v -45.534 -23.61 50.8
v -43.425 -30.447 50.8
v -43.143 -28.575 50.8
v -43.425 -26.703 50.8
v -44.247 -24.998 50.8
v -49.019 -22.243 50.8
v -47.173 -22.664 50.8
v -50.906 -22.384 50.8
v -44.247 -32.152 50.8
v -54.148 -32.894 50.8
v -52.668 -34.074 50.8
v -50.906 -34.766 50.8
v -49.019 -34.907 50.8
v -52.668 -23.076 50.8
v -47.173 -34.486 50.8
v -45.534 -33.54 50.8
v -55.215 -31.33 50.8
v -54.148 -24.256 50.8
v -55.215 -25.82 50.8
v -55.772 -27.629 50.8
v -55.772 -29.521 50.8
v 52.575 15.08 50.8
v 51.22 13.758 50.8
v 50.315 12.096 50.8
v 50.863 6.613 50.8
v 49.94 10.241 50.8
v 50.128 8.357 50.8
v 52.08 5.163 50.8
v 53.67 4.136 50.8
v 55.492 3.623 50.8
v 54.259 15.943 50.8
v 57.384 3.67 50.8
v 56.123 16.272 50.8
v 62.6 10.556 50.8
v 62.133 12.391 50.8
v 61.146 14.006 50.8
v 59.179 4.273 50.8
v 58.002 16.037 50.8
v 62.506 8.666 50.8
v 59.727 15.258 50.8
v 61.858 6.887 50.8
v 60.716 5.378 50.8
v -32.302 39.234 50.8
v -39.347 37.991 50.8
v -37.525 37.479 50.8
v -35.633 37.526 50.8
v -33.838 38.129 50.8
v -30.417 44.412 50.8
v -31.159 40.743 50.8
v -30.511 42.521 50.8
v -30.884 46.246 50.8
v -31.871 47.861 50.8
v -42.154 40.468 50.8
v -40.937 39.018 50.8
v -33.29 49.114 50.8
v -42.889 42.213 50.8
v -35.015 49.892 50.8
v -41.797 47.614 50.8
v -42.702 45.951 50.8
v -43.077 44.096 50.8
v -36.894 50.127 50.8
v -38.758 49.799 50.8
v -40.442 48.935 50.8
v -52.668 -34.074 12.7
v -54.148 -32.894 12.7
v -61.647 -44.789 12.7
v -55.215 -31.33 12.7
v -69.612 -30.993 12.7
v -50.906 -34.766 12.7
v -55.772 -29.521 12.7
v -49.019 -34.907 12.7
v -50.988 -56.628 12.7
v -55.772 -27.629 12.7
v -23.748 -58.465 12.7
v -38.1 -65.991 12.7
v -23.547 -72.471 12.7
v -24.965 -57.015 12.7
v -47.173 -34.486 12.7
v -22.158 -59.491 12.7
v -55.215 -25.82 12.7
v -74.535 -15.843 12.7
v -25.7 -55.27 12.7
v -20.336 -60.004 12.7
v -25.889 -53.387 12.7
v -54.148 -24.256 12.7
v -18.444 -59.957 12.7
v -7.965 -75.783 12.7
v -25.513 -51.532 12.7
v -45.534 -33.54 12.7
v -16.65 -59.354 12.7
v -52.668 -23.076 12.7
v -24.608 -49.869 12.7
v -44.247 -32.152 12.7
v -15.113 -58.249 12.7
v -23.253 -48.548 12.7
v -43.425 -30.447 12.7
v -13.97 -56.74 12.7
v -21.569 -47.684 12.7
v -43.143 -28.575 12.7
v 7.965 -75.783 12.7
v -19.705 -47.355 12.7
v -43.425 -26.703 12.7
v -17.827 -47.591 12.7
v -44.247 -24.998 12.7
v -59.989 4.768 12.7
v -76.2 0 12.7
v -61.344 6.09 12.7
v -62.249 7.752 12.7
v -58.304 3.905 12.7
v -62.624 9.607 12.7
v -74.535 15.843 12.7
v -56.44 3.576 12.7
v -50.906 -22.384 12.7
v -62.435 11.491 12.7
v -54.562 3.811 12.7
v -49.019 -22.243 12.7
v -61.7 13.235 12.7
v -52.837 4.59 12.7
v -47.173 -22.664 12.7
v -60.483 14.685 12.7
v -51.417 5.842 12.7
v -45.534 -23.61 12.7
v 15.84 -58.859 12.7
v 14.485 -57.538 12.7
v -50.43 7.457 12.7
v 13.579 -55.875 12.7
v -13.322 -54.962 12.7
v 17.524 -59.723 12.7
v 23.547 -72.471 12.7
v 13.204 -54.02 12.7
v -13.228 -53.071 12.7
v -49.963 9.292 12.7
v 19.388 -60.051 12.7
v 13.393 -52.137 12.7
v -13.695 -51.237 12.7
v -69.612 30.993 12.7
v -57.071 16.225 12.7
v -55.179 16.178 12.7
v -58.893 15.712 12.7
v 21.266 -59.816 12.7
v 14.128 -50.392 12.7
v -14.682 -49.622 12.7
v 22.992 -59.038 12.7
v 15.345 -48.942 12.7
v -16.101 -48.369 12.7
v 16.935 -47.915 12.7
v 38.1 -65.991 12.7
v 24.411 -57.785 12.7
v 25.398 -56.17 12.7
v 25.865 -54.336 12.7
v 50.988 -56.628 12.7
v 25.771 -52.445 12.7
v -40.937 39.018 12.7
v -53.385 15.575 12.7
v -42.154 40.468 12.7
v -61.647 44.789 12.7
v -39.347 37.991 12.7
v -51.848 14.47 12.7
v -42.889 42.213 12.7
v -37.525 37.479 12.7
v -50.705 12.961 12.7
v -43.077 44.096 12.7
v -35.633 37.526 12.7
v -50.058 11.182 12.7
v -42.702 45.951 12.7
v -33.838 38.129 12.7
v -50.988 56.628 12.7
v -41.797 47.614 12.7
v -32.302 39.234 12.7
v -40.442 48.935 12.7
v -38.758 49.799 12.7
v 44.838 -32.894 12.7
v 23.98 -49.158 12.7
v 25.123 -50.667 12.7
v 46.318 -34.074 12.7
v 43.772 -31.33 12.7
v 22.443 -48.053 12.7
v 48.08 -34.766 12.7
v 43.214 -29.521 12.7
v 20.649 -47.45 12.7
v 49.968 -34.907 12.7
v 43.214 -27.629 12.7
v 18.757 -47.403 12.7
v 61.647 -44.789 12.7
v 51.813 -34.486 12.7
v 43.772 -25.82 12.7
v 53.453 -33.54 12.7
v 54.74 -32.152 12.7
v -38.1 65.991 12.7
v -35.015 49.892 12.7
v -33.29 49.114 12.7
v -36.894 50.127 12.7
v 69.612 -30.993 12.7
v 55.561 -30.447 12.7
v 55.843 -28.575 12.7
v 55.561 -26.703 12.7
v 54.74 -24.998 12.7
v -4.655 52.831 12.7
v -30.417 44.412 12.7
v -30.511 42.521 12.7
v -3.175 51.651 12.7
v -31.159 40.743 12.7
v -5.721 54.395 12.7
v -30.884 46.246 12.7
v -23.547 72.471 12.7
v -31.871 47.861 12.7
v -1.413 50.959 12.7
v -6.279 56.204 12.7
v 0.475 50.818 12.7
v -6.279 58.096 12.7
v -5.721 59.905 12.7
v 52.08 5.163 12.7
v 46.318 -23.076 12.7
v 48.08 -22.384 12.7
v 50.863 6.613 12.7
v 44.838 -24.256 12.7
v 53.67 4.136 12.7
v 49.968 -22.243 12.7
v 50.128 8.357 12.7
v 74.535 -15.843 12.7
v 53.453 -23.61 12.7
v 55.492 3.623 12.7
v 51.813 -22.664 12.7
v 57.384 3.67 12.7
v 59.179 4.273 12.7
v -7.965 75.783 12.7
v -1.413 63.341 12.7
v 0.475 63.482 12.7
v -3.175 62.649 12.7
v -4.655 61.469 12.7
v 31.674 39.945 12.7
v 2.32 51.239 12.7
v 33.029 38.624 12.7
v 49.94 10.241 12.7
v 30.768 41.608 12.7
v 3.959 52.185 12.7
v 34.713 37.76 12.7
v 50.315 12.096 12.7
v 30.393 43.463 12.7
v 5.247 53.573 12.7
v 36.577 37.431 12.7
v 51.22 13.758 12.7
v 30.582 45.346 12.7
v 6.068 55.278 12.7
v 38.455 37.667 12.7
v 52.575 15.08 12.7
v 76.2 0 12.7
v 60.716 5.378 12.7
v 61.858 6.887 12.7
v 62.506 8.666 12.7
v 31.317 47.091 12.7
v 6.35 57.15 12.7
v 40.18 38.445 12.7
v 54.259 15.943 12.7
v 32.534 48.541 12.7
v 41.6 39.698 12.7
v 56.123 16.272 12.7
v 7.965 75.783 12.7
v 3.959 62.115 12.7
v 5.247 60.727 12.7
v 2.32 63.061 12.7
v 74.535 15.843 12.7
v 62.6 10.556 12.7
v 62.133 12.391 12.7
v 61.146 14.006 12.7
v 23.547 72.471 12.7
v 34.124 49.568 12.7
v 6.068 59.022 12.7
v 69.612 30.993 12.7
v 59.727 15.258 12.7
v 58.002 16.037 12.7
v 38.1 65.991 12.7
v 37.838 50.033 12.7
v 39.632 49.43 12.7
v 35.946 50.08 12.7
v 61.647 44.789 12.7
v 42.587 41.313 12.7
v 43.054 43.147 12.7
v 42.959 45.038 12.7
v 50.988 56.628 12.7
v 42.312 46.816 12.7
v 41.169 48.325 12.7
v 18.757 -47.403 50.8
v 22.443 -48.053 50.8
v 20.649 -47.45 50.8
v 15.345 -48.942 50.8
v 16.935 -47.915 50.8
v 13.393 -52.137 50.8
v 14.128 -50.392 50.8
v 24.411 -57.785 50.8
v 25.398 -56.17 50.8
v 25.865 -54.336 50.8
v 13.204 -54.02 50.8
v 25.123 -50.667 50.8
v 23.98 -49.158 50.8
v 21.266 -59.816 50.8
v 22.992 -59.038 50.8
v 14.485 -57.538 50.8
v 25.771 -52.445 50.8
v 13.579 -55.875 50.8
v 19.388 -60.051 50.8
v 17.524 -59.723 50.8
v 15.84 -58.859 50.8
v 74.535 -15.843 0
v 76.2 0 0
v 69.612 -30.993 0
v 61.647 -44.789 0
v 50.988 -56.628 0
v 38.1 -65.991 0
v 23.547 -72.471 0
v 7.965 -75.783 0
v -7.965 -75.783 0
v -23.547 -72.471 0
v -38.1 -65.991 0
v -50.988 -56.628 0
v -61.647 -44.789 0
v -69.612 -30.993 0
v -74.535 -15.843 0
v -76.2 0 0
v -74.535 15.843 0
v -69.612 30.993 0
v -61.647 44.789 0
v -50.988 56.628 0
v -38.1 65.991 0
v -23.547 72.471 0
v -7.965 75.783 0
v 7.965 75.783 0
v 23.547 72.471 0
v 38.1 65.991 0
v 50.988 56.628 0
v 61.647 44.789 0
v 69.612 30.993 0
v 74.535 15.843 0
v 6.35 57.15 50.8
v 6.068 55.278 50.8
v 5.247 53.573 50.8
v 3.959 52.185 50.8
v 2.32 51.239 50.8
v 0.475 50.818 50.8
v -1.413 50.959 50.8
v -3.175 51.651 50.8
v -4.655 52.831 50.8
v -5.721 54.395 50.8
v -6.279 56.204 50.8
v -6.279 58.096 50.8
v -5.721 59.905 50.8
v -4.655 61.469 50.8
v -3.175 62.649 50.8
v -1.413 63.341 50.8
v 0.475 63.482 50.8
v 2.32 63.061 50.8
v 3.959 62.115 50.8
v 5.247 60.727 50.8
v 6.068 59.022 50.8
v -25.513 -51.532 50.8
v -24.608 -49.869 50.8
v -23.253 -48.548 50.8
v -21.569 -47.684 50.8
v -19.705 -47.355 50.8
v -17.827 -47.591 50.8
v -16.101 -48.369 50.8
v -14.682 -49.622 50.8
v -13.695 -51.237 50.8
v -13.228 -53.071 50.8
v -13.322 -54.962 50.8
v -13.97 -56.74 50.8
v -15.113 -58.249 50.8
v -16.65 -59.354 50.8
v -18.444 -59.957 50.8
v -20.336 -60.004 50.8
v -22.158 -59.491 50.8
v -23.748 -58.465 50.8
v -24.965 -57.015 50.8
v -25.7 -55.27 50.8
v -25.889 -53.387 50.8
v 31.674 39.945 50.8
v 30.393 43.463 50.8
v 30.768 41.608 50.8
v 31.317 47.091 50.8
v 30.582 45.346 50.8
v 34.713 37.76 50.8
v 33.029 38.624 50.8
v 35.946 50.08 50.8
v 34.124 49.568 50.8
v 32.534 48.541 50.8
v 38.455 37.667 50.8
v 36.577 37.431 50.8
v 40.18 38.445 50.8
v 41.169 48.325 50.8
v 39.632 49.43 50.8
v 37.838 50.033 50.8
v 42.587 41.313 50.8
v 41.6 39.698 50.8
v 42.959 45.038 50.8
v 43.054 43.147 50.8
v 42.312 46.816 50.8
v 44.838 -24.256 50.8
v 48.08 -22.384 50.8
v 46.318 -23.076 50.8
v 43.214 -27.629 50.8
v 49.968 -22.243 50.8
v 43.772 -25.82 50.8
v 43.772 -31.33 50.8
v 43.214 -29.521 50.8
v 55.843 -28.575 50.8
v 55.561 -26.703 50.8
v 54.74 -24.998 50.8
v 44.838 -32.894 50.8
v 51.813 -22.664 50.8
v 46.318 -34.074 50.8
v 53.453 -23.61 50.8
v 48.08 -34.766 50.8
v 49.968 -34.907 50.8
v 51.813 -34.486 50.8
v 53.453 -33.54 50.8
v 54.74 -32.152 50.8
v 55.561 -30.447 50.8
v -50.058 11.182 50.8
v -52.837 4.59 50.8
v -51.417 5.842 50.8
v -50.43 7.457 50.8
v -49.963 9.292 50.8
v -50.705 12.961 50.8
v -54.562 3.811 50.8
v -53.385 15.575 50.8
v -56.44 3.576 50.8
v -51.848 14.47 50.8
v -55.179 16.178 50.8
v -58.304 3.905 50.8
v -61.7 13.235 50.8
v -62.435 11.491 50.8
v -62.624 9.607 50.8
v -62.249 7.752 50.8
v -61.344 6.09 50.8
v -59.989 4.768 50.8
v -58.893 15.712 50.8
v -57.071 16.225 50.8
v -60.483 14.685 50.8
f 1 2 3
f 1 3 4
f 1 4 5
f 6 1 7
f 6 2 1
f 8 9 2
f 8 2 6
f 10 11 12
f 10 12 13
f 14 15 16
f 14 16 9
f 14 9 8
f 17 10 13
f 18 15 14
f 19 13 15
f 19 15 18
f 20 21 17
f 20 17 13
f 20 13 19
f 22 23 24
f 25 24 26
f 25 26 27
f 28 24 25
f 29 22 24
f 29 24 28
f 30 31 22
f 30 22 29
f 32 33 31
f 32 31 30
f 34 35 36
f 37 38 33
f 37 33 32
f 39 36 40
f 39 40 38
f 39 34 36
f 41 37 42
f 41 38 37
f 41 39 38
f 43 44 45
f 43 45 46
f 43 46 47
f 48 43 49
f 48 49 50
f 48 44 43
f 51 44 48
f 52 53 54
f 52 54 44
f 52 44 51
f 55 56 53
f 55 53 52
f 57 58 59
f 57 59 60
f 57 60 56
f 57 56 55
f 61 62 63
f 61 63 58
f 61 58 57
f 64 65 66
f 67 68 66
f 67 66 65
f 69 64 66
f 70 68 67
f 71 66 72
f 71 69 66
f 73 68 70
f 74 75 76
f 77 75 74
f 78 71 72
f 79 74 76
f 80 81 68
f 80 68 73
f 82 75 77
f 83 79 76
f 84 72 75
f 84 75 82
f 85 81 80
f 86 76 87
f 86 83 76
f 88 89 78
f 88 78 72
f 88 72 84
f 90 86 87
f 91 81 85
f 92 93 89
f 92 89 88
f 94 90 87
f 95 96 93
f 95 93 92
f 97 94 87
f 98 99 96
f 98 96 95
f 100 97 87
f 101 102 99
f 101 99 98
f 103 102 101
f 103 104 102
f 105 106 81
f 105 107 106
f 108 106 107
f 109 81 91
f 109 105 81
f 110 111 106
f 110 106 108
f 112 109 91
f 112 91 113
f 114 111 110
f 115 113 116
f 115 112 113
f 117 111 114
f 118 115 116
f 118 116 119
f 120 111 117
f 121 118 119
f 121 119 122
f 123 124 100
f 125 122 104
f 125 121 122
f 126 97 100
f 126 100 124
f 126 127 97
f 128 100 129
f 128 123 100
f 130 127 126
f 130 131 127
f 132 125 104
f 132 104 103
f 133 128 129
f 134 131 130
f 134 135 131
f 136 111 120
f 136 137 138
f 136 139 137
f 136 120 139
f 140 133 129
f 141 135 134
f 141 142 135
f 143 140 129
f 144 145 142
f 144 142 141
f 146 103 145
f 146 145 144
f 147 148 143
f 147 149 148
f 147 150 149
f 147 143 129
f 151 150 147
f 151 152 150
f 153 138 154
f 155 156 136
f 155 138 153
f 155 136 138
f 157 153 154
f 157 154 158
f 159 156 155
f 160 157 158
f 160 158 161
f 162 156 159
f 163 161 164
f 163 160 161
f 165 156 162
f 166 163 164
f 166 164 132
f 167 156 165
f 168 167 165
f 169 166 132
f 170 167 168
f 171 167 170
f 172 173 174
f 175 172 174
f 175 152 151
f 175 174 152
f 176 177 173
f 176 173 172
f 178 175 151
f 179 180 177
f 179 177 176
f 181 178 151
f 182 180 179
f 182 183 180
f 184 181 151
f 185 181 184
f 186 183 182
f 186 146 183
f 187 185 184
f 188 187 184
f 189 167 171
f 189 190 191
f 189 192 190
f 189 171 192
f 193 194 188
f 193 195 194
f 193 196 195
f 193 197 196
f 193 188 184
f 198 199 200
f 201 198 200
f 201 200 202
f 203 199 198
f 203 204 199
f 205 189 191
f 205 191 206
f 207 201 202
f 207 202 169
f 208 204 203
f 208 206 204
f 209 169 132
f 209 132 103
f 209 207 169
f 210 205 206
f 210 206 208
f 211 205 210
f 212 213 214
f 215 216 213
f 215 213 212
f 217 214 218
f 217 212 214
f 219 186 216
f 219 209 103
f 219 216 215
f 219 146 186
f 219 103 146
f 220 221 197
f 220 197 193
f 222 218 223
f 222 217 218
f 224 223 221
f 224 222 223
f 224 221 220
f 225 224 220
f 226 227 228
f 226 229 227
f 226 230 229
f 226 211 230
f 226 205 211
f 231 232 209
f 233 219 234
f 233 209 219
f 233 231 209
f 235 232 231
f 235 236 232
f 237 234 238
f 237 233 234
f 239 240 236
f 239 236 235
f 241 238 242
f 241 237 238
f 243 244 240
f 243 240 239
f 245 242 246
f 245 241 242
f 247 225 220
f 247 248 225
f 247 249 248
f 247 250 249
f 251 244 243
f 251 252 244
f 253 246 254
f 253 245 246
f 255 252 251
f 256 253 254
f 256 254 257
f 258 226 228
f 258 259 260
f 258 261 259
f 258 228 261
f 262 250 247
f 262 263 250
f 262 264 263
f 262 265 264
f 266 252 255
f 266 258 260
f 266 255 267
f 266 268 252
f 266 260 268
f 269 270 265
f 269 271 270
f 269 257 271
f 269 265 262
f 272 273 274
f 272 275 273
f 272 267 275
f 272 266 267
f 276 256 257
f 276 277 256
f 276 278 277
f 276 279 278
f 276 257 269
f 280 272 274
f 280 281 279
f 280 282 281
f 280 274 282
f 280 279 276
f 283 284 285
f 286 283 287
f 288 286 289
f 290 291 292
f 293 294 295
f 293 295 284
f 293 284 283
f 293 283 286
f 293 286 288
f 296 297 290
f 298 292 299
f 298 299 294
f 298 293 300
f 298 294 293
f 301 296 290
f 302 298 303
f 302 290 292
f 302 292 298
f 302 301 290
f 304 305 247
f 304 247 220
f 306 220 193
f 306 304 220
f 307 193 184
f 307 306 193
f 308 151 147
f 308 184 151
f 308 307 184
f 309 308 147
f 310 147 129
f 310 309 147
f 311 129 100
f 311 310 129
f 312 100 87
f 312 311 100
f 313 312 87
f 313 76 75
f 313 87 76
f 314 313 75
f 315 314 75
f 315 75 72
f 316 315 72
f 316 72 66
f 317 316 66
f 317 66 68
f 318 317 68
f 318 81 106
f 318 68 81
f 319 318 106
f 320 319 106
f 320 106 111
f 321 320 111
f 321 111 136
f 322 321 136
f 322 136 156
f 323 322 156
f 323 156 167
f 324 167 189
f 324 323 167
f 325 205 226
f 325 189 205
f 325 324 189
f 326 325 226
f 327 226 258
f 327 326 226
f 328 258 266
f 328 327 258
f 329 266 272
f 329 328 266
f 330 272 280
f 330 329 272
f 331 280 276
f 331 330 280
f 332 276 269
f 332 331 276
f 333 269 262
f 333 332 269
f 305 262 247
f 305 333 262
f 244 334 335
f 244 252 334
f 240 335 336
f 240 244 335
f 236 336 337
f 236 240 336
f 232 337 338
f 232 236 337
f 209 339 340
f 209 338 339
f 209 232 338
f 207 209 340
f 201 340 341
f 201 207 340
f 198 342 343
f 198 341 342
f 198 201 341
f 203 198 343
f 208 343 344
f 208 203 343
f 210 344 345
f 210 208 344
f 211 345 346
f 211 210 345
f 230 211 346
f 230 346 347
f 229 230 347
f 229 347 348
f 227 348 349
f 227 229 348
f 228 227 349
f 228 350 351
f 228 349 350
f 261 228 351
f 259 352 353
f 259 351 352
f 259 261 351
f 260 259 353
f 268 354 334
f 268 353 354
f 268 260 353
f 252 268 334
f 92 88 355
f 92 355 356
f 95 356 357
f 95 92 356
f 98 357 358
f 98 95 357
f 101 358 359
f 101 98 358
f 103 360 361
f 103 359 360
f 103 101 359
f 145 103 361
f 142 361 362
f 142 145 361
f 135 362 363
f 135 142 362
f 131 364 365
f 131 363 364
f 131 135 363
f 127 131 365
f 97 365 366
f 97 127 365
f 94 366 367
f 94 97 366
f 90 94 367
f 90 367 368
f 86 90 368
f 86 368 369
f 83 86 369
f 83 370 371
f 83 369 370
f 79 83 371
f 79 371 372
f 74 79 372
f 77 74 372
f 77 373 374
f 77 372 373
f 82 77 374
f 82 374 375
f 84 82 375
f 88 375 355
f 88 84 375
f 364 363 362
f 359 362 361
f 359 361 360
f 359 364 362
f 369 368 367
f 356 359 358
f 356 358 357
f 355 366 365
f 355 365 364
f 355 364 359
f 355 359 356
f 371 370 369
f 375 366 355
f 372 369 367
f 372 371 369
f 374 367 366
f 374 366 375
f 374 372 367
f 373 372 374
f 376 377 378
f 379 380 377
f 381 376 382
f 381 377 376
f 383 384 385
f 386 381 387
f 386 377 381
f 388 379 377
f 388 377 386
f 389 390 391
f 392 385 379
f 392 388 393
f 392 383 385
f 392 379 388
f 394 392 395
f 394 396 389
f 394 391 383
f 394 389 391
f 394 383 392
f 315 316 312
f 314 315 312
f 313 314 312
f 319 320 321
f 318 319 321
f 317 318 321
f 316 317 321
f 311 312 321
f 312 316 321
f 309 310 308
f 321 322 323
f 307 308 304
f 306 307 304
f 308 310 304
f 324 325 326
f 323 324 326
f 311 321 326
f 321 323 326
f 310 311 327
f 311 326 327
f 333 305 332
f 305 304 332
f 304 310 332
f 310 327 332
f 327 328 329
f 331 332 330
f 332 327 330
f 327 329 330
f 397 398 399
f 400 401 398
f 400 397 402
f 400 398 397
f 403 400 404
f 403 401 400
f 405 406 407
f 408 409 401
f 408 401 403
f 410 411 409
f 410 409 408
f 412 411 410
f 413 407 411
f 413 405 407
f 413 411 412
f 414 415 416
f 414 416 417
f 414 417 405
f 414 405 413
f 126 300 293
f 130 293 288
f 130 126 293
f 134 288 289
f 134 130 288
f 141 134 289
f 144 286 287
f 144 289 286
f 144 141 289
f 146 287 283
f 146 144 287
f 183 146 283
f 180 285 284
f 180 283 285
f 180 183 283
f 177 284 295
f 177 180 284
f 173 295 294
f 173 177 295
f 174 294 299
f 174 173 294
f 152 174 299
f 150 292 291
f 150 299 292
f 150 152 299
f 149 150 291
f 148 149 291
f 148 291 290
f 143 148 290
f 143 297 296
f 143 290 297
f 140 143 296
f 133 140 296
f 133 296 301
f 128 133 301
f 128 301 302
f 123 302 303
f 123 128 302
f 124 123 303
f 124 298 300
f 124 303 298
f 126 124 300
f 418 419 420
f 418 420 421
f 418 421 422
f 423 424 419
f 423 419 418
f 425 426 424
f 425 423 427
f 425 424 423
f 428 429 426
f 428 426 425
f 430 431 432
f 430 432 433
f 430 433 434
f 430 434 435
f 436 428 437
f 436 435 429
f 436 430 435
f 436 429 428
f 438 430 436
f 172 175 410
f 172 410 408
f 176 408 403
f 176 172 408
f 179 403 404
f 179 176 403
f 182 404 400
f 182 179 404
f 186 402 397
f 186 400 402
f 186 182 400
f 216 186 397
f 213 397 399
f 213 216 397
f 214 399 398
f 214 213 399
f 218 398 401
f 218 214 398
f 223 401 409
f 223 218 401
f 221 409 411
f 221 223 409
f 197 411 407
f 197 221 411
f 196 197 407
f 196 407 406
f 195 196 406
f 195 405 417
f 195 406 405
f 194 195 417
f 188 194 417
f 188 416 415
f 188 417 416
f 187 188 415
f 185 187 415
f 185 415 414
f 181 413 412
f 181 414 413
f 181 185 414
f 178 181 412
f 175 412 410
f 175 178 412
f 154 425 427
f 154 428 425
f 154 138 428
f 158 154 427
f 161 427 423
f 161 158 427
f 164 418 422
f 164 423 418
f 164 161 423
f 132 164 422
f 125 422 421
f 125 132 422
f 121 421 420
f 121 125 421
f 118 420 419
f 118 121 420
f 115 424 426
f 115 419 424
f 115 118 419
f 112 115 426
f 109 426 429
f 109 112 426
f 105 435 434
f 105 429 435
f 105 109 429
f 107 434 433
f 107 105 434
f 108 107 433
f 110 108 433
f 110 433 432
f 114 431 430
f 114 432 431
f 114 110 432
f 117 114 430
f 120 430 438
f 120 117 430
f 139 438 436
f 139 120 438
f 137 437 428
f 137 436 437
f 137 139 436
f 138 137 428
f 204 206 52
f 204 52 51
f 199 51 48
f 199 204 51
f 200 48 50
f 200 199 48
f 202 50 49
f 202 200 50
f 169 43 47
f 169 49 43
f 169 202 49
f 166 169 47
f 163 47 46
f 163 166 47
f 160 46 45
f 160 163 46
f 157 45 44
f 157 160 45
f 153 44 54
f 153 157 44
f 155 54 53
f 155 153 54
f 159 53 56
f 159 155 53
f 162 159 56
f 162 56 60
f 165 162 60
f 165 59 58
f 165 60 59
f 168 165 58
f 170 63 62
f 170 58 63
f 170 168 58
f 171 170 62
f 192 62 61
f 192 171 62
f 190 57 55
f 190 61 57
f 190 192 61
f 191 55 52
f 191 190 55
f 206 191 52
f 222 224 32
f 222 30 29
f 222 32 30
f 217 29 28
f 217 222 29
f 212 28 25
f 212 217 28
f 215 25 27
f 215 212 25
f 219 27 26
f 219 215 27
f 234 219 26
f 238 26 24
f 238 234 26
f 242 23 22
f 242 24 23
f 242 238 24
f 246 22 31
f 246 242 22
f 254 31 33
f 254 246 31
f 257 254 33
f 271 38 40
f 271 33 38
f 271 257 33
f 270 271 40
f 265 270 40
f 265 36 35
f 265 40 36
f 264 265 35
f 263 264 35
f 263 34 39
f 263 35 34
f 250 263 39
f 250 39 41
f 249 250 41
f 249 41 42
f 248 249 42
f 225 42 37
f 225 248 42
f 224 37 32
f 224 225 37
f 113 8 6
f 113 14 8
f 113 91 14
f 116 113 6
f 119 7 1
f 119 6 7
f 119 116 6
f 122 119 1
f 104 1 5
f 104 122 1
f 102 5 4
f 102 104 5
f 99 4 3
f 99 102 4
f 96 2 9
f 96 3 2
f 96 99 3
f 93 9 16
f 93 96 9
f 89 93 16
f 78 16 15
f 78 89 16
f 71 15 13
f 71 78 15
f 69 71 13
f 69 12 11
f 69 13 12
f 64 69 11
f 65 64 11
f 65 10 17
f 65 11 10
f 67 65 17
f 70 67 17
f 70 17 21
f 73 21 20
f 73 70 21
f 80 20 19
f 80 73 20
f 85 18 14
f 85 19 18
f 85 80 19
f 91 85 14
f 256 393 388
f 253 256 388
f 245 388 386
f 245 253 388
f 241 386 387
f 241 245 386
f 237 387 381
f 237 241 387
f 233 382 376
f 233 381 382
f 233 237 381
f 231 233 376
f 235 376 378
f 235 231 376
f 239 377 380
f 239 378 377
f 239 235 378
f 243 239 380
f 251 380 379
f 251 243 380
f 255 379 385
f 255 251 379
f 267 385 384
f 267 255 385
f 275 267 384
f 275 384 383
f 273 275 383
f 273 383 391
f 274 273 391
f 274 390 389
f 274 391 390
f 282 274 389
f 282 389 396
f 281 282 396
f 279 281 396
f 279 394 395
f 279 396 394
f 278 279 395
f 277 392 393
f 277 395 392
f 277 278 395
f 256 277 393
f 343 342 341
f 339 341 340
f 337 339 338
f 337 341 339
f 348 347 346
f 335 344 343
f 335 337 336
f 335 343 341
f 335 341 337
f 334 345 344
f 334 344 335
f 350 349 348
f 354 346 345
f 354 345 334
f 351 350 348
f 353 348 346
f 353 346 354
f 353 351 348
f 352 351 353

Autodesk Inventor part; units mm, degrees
ref_plane "YZ Plane" through (0, 0, 0) normal (1, 0, 0) x (0, 1, 0)
ref_plane "XZ Plane" through (0, 0, 0) normal (0, 1, 0) x (-1, 0, 0)
ref_plane "XY Plane" through (0, 0, 0) normal (0, 0, 1) x (1, 0, 0)
sketch "Sketch1" plane through (0, 0, 0) normal (0, 0, 1) x (1, 0, 0)
  circle A0 centre (0, 0) radius 76.2
  dimension "d0" = 152.4
extrude "Extrusion1" add sketch "Sketch1" along normal blind 12.7
sketch "Sketch2" plane through (0, 0, 12.7) normal (0, 0, 1) x (1, 0, 0)
  circle A0 centre (0, 0) radius 76.2 projected
  circle A1 centre (0, 57.15) radius 6.35
  dimension "d3" = 12.7
  dimension "d4" = 57.15
extrude "Extrusion2" add sketch "Sketch2" along normal blind 38.1 contours A1
pattern_circular "Circular Pattern1" count 9 over 360 about axis through (0, 0, 0) along (0, 0, 1) of "Extrusion2"
properties part number "holder"
